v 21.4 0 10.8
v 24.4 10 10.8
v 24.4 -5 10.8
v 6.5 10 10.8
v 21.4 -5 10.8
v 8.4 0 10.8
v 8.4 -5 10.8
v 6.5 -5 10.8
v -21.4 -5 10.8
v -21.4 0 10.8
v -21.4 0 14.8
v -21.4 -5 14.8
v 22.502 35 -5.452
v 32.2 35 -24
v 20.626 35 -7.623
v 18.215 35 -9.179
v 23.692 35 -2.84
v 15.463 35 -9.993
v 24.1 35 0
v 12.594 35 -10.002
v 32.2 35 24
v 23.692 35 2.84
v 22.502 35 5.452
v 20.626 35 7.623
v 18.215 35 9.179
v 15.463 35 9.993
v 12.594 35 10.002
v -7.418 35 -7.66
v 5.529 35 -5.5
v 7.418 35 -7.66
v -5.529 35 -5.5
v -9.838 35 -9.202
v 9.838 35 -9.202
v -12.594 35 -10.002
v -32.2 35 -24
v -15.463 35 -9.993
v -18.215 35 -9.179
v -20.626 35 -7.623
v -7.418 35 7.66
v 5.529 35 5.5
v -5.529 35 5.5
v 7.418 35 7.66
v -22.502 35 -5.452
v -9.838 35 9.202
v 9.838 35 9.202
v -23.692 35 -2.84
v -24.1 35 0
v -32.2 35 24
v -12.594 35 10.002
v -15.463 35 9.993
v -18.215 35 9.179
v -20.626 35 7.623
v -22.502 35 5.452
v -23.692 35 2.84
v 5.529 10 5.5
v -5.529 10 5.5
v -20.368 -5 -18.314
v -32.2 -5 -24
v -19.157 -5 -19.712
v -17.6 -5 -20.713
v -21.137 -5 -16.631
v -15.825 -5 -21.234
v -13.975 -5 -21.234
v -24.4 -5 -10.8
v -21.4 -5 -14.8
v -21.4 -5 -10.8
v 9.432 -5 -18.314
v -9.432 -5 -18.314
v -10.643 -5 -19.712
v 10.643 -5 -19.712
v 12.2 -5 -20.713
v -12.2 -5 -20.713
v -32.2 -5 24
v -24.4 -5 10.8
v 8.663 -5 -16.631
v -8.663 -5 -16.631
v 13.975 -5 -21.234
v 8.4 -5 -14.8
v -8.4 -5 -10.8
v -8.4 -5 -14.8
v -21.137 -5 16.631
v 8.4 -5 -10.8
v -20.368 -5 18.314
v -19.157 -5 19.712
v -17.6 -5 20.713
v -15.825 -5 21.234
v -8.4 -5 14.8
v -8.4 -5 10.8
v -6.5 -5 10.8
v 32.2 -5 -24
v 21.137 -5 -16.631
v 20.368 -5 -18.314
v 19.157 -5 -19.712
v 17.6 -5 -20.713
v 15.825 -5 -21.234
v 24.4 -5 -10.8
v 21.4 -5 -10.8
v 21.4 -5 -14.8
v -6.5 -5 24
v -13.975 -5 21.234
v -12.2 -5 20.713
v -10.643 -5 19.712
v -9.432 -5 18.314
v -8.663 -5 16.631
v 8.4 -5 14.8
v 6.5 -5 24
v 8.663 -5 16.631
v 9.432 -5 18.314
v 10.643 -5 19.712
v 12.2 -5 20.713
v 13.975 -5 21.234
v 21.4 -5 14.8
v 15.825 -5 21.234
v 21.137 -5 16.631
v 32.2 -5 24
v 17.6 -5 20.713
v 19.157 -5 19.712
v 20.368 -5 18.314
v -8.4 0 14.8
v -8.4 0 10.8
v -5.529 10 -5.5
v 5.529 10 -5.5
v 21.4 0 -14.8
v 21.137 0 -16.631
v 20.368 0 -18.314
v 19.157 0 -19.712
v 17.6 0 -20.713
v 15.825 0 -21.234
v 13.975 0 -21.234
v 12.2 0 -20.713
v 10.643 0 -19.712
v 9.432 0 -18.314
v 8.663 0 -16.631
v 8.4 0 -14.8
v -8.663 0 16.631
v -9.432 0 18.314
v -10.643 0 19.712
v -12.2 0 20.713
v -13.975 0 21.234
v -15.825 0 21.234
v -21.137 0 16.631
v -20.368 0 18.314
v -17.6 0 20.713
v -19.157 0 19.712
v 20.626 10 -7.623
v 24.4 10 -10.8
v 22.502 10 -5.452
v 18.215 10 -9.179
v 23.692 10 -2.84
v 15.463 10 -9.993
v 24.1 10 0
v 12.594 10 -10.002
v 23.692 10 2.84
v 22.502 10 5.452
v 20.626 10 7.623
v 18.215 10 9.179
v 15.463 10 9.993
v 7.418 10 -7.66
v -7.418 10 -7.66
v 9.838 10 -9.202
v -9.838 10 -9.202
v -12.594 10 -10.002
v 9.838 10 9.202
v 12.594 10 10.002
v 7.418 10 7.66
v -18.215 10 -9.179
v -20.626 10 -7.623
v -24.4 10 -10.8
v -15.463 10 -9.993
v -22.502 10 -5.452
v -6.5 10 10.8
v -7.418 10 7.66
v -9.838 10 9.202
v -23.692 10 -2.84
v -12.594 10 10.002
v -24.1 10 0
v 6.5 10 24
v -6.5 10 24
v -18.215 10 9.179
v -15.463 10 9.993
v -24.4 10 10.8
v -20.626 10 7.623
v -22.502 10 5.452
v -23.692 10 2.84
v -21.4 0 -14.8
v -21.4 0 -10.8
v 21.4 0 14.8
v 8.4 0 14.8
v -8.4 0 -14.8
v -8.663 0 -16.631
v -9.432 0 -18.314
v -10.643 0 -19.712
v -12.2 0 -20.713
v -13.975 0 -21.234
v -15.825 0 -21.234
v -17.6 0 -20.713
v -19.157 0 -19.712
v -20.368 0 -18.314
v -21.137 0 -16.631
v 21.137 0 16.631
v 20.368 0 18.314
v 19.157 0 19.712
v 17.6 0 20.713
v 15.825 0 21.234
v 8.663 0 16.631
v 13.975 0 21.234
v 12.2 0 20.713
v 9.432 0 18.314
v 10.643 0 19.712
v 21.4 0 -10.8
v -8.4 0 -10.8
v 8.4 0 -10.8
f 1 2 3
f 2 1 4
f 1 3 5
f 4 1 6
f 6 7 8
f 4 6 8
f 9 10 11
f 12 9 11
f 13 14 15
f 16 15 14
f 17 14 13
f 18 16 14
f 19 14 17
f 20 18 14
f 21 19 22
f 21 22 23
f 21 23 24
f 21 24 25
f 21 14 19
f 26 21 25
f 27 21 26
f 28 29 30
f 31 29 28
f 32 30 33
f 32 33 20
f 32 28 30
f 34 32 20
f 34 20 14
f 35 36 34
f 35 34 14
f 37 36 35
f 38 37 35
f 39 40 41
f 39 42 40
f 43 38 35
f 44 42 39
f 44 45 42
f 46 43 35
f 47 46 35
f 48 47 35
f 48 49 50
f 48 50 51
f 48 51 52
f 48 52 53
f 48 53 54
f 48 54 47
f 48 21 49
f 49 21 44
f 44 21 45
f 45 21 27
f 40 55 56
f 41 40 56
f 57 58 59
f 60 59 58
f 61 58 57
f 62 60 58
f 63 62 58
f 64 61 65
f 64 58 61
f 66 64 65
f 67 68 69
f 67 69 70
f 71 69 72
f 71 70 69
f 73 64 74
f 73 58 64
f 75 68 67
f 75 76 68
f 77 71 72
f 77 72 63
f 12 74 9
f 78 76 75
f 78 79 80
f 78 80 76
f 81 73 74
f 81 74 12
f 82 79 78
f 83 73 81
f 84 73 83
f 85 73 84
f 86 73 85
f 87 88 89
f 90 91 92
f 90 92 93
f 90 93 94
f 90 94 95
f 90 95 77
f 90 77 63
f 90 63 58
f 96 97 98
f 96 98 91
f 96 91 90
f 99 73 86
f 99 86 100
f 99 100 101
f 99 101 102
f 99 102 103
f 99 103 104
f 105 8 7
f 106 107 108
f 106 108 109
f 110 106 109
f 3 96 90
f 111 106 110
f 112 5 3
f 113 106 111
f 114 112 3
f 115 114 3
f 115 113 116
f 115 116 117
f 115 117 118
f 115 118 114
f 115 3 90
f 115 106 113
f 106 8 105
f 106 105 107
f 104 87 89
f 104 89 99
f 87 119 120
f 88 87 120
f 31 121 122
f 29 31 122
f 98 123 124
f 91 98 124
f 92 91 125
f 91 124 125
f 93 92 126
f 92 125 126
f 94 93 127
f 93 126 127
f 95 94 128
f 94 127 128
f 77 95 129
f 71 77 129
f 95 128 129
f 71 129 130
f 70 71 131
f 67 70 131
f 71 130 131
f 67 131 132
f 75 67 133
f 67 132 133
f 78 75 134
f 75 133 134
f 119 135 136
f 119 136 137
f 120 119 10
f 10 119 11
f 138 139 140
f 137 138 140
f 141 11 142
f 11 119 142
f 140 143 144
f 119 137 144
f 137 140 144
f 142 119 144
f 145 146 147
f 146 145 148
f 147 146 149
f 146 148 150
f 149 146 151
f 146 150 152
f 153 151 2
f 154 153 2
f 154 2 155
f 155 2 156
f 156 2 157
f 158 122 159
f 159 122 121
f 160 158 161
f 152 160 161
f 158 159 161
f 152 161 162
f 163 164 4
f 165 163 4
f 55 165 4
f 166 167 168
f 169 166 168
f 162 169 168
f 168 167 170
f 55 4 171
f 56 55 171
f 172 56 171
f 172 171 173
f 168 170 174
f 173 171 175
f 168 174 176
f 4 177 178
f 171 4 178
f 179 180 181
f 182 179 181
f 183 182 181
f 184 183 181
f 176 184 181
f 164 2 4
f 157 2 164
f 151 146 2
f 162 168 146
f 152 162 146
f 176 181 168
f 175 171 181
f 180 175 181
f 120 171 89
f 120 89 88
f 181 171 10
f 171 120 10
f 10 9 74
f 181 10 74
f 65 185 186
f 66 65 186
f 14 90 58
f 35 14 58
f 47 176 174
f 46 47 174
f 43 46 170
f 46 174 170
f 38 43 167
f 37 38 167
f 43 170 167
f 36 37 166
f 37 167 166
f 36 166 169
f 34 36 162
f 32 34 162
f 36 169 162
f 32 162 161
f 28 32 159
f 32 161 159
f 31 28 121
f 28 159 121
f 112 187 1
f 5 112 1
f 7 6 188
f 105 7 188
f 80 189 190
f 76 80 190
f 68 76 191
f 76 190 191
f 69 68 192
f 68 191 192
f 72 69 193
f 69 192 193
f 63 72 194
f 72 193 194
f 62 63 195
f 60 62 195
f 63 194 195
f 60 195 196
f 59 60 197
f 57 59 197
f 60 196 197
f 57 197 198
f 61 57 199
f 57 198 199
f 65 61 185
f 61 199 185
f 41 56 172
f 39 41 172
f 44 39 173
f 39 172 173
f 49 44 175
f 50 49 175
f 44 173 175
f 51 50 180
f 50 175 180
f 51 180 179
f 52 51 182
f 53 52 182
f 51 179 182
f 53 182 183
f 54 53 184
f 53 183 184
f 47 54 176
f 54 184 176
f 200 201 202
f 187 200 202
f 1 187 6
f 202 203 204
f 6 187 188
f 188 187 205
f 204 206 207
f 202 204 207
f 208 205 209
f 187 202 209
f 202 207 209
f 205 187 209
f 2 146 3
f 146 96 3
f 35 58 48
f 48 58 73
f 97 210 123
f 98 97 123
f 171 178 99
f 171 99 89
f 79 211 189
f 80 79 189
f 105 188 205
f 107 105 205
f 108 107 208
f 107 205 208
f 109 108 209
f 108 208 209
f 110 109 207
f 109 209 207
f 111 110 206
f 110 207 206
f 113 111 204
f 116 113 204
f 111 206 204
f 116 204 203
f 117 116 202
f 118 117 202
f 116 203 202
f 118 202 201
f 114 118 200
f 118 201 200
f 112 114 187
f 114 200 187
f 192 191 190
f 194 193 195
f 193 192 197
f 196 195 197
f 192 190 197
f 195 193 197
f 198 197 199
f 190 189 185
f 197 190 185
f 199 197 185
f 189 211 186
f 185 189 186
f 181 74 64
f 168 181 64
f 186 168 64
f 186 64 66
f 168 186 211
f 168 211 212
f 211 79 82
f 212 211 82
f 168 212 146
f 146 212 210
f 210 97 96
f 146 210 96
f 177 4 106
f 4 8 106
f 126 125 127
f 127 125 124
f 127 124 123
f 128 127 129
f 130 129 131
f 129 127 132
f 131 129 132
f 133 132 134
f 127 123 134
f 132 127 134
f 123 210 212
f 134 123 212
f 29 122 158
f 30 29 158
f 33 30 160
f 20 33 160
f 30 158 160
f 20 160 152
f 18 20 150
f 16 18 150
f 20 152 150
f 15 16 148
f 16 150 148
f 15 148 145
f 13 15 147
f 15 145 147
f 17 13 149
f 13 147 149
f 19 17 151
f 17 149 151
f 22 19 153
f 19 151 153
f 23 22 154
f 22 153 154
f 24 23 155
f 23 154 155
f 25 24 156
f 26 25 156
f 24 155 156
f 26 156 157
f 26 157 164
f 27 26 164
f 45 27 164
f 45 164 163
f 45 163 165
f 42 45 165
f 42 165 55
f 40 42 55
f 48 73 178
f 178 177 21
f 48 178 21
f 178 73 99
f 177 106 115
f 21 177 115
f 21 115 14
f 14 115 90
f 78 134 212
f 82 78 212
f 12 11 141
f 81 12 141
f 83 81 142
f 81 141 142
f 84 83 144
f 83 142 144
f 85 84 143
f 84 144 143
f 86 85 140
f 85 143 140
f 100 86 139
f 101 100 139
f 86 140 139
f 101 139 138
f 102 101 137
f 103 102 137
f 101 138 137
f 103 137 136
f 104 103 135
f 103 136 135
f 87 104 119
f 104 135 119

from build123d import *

# Parameters (mm, degrees)
F1_DEPTH = 5
F3_DEPTH = 10
F5_DEPTH = 25


with BuildPart() as f1:
    # F0 (on Front) → F1 (new body)
    with BuildSketch(Plane.XZ):
        with BuildLine():
            Line((32.2, -24), (32.2, 24))
            Line((32.2, 24), (6.5, 24))
            Line((6.5, 24), (6.5, 10.8))
            Line((6.5, 10.8), (8.4, 10.8))
            Line((8.4, 10.8), (8.4, 14.8))
            ThreePointArc((8.4, 14.8), (14.9, 21.3), (21.4, 14.8))
            Line((21.4, 14.8), (21.4, 10.8))
            Line((21.4, 10.8), (24.4, 10.8))
            Line((24.4, 10.8), (24.4, -10.8))
            Line((24.4, -10.8), (21.4, -10.8))
            Line((21.4, -10.8), (21.4, -14.8))
            ThreePointArc((21.4, -14.8), (14.9, -21.3), (8.4, -14.8))
            Line((8.4, -14.8), (8.4, -10.8))
            Line((8.4, -10.8), (-8.4, -10.8))
            Line((-8.4, -10.8), (-8.4, -14.8))
            ThreePointArc((-8.4, -14.8), (-14.9, -21.3), (-21.4, -14.8))
            Line((-21.4, -14.8), (-21.4, -10.8))
            Line((-21.4, -10.8), (-24.4, -10.8))
            Line((-24.4, -10.8), (-24.4, 10.8))
            Line((-24.4, 10.8), (-21.4, 10.8))
            Line((-21.4, 10.8), (-21.4, 14.8))
            ThreePointArc((-21.4, 14.8), (-14.9, 21.3), (-8.4, 14.8))
            Line((-8.4, 14.8), (-8.4, 10.8))
            Line((-8.4, 10.8), (-6.5, 10.8))
            Line((-6.5, 10.8), (-6.5, 24))
            Line((-6.5, 24), (-32.2, 24))
            Line((-32.2, 24), (-32.2, -24))
            Line((-32.2, -24), (32.2, -24))
        make_face()
    extrude(amount=F1_DEPTH)

    # F2 (on face) → F3 (join)
    with BuildSketch(Plane(origin=(0, 0, 0), x_dir=(-1, 0, 0), z_dir=(0, 1, 0))):
        with BuildLine():
            Line((24.4, 10.8), (24.4, -10.8))
            Line((24.4, -10.8), (21.4, -10.8))
            Line((21.4, -10.8), (21.4, -14.8))
            ThreePointArc((21.4, -14.8), (14.9, -21.3), (8.4, -14.8))
            Line((8.4, -14.8), (8.4, -10.8))
            Line((8.4, -10.8), (-8.4, -10.8))
            Line((-8.4, -10.8), (-8.4, -14.8))
            ThreePointArc((-8.4, -14.8), (-14.9, -21.3), (-21.4, -14.8))
            Line((-21.4, -14.8), (-21.4, -10.8))
            Line((-21.4, -10.8), (-24.4, -10.8))
            Line((-24.4, -10.8), (-24.4, 10.8))
            Line((-24.4, 10.8), (-21.4, 10.8))
            Line((-21.4, 10.8), (-21.4, 14.8))
            ThreePointArc((-21.4, 14.8), (-14.9, 21.3), (-8.4, 14.8))
            Line((-8.4, 14.8), (-8.4, 10.8))
            Line((-8.4, 10.8), (-6.5, 10.8))
            Line((-6.5, 10.8), (-6.5, 24))
            Line((-6.5, 24), (-32.2, 24))
            Line((-32.2, 24), (-32.2, -24))
            Line((-32.2, -24), (32.2, -24))
            Line((32.2, -24), (32.2, 24))
            Line((32.2, 24), (6.5, 24))
            Line((6.5, 24), (6.5, 10.8))
            Line((6.5, 10.8), (8.4, 10.8))
            Line((8.4, 10.8), (8.4, 14.8))
            ThreePointArc((8.4, 14.8), (14.9, 21.3), (21.4, 14.8))
            Line((21.4, 14.8), (21.4, 10.8))
            Line((21.4, 10.8), (24.4, 10.8))
        make_face()
        with BuildLine():
            Line((21.4, -14.8), (21.4, -10.8))
            Line((21.4, -10.8), (8.4, -10.8))
            Line((8.4, -10.8), (8.4, -14.8))
            ThreePointArc((8.4, -14.8), (14.9, -21.3), (21.4, -14.8))
        make_face()
        with BuildLine():
            Line((-8.4, -14.8), (-8.4, -10.8))
            Line((-8.4, -10.8), (-21.4, -10.8))
            Line((-21.4, -10.8), (-21.4, -14.8))
            ThreePointArc((-21.4, -14.8), (-14.9, -21.3), (-8.4, -14.8))
        make_face()
        with BuildLine():
            Line((8.4, 10.8), (21.4, 10.8))
            Line((21.4, 10.8), (21.4, 14.8))
            ThreePointArc((21.4, 14.8), (14.9, 21.3), (8.4, 14.8))
            Line((8.4, 14.8), (8.4, 10.8))
        make_face()
        with BuildLine():
            Line((-21.4, 10.8), (-8.4, 10.8))
            Line((-8.4, 10.8), (-8.4, 14.8))
            ThreePointArc((-8.4, 14.8), (-14.9, 21.3), (-21.4, 14.8))
            Line((-21.4, 14.8), (-21.4, 10.8))
        make_face()
    extrude(amount=F3_DEPTH)

    # F4 (on face) → F5 (join)
    with BuildSketch(Plane(origin=(0, 10, 0), x_dir=(-1, 0, 0), z_dir=(0, 1, 0))):
        Polygon((32.2, -24), (32.2, 24), (6.5, 24), (6.5, 10.8), (24.4, 10.8), (24.4, -10.8), (-24.4, -10.8), (-24.4, 10.8), (-6.5, 10.8), (-6.5, 24), (-32.2, 24), (-32.2, -24), align=None)
        Polygon((6.5, 10.8), (6.5, 24), (-6.5, 24), (-6.5, 10.8), (-24.4, 10.8), (-24.4, -10.8), (24.4, -10.8), (24.4, 10.8), align=None)
        with BuildLine():
            ThreePointArc((5.5288725662, 5.5), (16.8680666762, 9.6842239514), (24.1, 0))
            ThreePointArc((24.1, 0), (16.8680666762, -9.6842239514), (5.5288725662, -5.5))
            Line((5.5288725662, -5.5), (0, -5.5))
            Line((0, -5.5), (-5.5288725662, -5.5))
            ThreePointArc((-5.5288725662, -5.5), (-24.1, 0), (-5.5288725662, 5.5))
            Line((-5.5288725662, 5.5), (0, 5.5))
            Line((0, 5.5), (5.5288725662, 5.5))
        make_face(mode=Mode.SUBTRACT)
    extrude(amount=F5_DEPTH)


solid = f1.part
